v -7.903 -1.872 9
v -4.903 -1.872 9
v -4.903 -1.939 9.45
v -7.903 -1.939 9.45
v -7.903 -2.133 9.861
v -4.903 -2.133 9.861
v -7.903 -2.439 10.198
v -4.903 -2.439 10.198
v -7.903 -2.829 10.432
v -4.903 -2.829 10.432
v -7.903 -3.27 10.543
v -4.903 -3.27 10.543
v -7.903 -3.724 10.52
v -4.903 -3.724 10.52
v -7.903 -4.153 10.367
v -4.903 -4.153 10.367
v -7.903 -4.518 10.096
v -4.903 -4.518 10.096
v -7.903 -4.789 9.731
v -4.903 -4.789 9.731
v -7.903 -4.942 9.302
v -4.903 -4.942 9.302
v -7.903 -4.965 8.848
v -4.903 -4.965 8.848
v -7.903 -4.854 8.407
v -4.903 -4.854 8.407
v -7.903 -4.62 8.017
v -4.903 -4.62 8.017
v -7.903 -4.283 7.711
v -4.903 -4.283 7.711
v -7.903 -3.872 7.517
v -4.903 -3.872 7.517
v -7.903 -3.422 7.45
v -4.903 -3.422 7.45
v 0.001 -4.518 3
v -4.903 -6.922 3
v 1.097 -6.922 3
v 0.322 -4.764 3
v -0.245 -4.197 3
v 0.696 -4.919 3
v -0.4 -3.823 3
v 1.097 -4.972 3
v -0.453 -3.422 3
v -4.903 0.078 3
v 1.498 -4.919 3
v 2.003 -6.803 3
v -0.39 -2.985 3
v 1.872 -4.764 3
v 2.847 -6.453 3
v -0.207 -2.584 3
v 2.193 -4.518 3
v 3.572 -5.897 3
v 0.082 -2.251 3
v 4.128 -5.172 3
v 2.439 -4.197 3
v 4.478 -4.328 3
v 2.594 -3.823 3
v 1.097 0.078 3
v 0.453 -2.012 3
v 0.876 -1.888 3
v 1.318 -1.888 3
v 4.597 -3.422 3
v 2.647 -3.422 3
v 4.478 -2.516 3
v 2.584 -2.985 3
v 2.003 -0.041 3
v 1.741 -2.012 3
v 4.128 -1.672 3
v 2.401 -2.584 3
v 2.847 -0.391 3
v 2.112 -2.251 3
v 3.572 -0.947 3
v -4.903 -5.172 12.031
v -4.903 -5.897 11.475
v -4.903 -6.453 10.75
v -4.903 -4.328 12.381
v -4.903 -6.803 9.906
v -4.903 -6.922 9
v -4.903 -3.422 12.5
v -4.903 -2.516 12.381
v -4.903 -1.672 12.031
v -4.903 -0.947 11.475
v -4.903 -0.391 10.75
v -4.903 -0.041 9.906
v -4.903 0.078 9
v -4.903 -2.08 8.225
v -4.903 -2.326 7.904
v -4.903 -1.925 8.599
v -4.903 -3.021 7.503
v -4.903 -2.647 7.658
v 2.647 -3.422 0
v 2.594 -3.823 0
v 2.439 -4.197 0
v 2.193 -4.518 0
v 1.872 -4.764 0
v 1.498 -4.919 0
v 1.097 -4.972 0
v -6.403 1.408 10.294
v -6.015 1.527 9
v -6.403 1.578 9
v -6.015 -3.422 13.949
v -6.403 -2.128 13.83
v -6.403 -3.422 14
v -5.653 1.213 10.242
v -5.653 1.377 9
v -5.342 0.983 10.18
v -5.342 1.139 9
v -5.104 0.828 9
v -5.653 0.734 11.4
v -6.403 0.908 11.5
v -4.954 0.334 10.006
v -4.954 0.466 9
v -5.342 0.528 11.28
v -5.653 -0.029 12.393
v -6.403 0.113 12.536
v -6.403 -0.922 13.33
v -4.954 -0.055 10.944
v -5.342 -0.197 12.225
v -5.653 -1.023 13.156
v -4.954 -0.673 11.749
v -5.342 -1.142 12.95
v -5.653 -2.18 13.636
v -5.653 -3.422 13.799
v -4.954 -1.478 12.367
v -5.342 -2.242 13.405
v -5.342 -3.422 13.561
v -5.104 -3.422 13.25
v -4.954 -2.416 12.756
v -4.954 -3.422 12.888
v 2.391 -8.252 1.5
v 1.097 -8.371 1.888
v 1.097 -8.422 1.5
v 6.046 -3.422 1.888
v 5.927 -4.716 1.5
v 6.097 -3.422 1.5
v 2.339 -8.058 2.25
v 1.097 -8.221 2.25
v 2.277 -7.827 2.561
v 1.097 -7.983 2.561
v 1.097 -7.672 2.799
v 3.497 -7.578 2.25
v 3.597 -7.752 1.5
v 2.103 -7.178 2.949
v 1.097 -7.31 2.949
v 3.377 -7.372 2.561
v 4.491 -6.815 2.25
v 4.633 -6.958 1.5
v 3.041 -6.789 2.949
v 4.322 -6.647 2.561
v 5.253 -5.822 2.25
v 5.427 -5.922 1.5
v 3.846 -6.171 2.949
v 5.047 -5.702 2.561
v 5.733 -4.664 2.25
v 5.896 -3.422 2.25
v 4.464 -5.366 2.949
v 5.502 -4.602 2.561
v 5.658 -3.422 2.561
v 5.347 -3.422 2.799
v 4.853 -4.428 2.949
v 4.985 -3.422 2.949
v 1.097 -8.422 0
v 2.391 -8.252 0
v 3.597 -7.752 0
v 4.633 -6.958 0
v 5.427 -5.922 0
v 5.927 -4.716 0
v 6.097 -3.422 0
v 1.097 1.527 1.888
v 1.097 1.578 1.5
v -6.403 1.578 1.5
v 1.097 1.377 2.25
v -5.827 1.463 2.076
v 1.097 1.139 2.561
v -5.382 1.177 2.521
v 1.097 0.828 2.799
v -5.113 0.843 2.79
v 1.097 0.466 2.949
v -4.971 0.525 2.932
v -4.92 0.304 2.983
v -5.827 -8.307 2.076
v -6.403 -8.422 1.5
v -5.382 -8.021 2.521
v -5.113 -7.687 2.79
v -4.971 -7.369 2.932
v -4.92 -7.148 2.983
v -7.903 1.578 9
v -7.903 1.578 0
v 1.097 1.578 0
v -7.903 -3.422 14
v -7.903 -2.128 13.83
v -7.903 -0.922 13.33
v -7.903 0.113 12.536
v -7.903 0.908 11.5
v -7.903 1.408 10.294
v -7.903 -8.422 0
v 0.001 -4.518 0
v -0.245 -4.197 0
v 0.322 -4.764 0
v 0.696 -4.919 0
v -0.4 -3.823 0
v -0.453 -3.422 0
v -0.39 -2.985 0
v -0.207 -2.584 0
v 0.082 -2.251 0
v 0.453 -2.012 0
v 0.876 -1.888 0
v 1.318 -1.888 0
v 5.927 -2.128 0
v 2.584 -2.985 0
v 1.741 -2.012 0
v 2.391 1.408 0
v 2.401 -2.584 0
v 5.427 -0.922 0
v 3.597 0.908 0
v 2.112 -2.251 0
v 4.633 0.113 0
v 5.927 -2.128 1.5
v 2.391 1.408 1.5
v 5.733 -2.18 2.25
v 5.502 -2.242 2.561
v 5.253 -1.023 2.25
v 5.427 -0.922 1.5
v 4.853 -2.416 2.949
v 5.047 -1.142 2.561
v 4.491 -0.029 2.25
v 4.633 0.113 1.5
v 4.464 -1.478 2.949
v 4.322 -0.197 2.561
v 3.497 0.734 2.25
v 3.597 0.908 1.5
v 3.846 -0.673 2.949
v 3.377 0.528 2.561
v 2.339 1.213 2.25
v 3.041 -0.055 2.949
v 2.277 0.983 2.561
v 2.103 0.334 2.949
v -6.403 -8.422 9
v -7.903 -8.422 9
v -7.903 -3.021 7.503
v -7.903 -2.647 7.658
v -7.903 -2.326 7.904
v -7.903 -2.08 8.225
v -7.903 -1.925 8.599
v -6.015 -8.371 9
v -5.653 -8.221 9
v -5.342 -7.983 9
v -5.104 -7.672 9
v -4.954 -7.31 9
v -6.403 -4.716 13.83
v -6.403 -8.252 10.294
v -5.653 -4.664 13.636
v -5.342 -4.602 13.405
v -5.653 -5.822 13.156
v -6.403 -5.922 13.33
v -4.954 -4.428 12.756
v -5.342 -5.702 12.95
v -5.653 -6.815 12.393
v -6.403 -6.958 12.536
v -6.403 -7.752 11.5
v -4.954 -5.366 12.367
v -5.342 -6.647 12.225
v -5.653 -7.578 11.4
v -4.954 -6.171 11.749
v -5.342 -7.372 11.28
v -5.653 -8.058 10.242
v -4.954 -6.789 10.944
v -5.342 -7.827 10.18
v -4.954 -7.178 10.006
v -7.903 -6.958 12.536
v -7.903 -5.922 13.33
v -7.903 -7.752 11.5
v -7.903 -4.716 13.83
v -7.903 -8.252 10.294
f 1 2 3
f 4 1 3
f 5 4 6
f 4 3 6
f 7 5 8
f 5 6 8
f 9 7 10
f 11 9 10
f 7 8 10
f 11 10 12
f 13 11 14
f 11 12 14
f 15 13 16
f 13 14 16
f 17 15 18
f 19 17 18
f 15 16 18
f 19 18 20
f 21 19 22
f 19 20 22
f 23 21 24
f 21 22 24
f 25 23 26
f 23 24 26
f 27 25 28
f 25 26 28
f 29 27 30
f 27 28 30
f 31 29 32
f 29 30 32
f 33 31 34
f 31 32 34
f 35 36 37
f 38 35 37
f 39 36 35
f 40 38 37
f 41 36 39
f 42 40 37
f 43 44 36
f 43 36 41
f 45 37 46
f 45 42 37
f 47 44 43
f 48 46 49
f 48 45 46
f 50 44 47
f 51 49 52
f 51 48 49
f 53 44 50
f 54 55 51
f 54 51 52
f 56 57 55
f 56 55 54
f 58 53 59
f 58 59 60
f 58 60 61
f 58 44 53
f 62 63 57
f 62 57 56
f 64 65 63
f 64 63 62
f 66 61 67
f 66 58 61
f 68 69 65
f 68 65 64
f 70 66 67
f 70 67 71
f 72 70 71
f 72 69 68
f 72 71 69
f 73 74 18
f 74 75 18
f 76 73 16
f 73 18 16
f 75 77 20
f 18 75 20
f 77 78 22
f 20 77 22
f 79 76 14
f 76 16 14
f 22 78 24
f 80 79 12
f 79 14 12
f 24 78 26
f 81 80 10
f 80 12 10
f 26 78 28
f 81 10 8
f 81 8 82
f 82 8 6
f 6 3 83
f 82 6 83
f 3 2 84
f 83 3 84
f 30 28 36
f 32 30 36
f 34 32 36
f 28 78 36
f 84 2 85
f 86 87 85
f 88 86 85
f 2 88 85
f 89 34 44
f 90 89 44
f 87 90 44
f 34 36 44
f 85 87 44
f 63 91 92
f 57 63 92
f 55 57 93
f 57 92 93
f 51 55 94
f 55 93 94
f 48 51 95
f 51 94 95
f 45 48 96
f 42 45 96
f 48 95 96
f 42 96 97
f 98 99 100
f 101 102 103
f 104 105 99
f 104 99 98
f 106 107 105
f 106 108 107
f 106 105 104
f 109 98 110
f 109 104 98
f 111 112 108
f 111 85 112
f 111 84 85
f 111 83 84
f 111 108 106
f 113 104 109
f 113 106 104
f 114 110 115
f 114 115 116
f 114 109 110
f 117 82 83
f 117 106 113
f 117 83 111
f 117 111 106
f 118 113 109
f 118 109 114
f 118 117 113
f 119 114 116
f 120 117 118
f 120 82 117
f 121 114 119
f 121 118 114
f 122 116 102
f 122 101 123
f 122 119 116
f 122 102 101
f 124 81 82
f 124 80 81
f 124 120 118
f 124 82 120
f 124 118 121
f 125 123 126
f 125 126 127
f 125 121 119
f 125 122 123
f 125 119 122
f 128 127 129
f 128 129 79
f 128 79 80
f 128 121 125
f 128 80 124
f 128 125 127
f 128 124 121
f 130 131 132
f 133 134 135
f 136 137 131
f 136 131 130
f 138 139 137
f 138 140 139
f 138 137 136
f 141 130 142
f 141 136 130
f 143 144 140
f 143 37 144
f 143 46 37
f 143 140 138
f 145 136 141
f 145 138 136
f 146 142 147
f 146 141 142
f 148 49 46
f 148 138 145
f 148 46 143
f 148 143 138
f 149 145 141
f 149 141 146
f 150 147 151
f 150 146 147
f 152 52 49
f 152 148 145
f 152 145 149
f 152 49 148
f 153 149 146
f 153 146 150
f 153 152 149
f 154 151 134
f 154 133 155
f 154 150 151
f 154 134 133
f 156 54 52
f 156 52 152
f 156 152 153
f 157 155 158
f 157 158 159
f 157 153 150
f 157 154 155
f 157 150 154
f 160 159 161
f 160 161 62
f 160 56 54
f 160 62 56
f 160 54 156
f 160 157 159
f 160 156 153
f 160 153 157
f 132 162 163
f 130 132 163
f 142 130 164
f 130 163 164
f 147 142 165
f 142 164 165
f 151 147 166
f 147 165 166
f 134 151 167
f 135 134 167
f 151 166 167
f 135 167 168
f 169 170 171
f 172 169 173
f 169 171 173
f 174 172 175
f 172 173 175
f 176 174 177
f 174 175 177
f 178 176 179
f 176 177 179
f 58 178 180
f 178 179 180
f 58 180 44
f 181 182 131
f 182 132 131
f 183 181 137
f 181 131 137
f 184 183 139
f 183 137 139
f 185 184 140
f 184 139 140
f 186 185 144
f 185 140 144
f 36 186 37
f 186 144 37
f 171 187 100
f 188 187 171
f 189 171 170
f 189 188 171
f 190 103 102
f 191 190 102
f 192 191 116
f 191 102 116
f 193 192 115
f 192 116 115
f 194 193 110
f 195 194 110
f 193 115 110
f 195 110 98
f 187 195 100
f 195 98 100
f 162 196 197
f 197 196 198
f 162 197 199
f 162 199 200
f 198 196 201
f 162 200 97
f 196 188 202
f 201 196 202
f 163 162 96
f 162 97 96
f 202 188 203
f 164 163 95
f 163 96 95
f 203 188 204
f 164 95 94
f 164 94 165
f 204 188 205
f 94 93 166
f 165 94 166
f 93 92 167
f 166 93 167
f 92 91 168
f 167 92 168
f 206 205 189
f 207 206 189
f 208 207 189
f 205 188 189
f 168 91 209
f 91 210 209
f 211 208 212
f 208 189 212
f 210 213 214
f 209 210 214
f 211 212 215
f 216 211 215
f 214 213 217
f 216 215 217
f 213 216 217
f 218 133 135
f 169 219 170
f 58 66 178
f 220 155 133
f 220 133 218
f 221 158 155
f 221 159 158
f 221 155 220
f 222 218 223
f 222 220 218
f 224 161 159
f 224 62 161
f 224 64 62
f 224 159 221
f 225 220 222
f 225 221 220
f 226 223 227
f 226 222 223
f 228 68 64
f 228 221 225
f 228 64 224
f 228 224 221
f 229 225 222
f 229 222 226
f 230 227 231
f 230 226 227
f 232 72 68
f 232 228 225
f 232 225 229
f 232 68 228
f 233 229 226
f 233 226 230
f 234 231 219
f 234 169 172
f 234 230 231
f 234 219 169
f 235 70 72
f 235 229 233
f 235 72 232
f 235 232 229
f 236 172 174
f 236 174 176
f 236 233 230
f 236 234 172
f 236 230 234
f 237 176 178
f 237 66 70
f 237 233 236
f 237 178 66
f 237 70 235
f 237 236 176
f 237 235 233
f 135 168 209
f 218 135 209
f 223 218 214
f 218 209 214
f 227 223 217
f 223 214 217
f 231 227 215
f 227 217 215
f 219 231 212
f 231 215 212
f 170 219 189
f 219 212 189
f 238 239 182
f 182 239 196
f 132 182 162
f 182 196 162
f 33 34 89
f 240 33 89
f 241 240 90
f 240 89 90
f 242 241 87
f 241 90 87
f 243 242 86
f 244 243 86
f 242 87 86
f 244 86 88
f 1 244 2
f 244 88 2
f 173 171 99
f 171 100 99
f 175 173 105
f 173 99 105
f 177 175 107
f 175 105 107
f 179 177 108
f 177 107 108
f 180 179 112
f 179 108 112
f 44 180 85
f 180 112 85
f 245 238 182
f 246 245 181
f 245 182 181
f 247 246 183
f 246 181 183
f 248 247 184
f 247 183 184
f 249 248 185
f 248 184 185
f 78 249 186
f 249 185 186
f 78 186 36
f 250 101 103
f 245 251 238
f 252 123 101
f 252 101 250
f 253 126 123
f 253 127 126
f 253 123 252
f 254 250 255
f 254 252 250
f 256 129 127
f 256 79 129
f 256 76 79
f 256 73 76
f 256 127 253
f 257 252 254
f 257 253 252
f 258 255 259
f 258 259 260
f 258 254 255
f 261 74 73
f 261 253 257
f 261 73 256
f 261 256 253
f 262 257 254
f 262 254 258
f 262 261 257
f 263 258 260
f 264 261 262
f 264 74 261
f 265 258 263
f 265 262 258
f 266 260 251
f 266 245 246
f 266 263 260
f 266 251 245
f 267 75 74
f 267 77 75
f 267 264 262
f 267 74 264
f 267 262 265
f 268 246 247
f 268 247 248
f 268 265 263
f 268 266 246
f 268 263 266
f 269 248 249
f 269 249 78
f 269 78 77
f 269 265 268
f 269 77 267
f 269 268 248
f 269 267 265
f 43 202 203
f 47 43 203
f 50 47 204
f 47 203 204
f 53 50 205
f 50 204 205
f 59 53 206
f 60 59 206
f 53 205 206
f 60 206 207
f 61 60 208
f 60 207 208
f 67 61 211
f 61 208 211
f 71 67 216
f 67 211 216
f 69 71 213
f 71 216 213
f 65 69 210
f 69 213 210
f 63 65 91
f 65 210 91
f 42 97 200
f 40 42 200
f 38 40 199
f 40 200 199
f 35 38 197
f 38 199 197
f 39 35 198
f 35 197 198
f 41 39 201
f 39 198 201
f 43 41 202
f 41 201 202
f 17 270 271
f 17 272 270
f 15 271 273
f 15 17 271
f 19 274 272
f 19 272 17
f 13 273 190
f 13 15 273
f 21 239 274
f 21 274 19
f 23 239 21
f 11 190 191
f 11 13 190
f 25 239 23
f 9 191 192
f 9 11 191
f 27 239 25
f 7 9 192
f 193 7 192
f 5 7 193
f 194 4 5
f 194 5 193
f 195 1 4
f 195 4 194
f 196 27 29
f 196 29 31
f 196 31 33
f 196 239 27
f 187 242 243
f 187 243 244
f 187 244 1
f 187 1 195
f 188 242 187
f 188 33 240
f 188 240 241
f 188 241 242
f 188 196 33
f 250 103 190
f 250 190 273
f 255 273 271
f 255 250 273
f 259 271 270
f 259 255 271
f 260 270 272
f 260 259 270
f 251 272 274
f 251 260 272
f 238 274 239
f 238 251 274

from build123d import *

# Parameters (mm, degrees)
F0_W     = 3
F0_H     = 5
F1_DEPTH = 3
F2_W     = 3
F2_H     = 10
F3_DEPTH = 11
F5_DEPTH = 25
F6_R     = 4.99999
F7_R     = 1.5


# Not quite as in the source:
# - a fillet or chamfer is up to 0.001 mm smaller than in the source, because OpenCascade refuses the exact size


with BuildPart() as f1:
    # F0 (on Top) → F1 (new body)
    with BuildSketch(Plane.XY):
        with Locations((-6.4029270411, -0.9220428518)):
            Rectangle(F0_W, F0_H)
        with Locations((-6.4029270411, -5.9220428518)):
            Rectangle(F0_W, F0_H)
        with BuildLine():
            Line((-4.9029270411, 1.5779571482), (-4.9029270411, -3.4220428518))
            Line((-4.9029270411, -3.4220428518), (-0.4529270411, -3.4220428518))
            ThreePointArc((-0.4529270411, -3.4220428518), (1.0970729589, -1.8720428518), (2.6470729589, -3.4220428518))
            ThreePointArc((2.6470729589, -3.4220428518), (2.1930884698, -4.5180583627), (1.0970729589, -4.9720428518))
            Line((1.0970729589, -4.9720428518), (1.0970729589, -8.4220428518))
            ThreePointArc((1.0970729589, -8.4220428518), (4.6326068649, -6.9575767578), (6.0970729589, -3.4220428518))
            ThreePointArc((6.0970729589, -3.4220428518), (4.6326068649, 0.1134910541), (1.0970729589, 1.5779571482))
            Line((1.0970729589, 1.5779571482), (-4.9029270411, 1.5779571482))
        make_face()
        with BuildLine():
            Line((-0.4529270411, -3.4220428518), (-4.9029270411, -3.4220428518))
            Line((-4.9029270411, -3.4220428518), (-4.9029270411, -8.4220428518))
            Line((-4.9029270411, -8.4220428518), (1.0970729589, -8.4220428518))
            Line((1.0970729589, -8.4220428518), (1.0970729589, -4.9720428518))
            ThreePointArc((1.0970729589, -4.9720428518), (0.0010574481, -4.5180583627), (-0.4529270411, -3.4220428518))
        make_face()
    extrude(amount=F1_DEPTH)

    # F2 (on face) → F3 (join)
    with BuildSketch(Plane.XY.offset(3)):
        with Locations((-6.4029270411, -3.4220428518)):
            Rectangle(F2_W, F2_H)
    extrude(amount=F3_DEPTH)

    # F4 (on face) → F5 (cut)
    with BuildSketch(Plane.YZ.offset(-4.9029270411)):
        with BuildLine():
            ThreePointArc((-1.8720428518, 9), (-4.5180583627, 10.0960155108), (-3.4220428518, 7.45))
            Line((-3.4220428518, 7.45), (-3.4220428518, 9))
            Line((-3.4220428518, 9), (-1.8720428518, 9))
        make_face()
        with BuildLine():
            Line((-3.4220428518, 9), (-3.4220428518, 7.45))
            ThreePointArc((-3.4220428518, 7.45), (-2.326027341, 7.9039844892), (-1.8720428518, 9))
            Line((-1.8720428518, 9), (-3.4220428518, 9))
        make_face()
    extrude(amount=-F5_DEPTH, mode=Mode.SUBTRACT)

    # F6 (radius 5 in the source; OpenCascade refuses exactly that, so slightly less here)
    f6_edges = [f1.edges().sort_by_distance(p)[0] for p in [
        (-6.402927, -8.422043, 14),
        (-6.402927, 1.577957, 14),
    ]]
    fillet(f6_edges, radius=F6_R)

    # F7
    f7_edges = [f1.edges().sort_by_distance(p)[0] for p in [
        (-4.902927, -6.95758, 12.535537),
        (-4.902927, -8.422043, 6.000005),
        (-1.902927, -8.422043, 3),
    ]]
    fillet(f7_edges, radius=F7_R)


solid = f1.part
